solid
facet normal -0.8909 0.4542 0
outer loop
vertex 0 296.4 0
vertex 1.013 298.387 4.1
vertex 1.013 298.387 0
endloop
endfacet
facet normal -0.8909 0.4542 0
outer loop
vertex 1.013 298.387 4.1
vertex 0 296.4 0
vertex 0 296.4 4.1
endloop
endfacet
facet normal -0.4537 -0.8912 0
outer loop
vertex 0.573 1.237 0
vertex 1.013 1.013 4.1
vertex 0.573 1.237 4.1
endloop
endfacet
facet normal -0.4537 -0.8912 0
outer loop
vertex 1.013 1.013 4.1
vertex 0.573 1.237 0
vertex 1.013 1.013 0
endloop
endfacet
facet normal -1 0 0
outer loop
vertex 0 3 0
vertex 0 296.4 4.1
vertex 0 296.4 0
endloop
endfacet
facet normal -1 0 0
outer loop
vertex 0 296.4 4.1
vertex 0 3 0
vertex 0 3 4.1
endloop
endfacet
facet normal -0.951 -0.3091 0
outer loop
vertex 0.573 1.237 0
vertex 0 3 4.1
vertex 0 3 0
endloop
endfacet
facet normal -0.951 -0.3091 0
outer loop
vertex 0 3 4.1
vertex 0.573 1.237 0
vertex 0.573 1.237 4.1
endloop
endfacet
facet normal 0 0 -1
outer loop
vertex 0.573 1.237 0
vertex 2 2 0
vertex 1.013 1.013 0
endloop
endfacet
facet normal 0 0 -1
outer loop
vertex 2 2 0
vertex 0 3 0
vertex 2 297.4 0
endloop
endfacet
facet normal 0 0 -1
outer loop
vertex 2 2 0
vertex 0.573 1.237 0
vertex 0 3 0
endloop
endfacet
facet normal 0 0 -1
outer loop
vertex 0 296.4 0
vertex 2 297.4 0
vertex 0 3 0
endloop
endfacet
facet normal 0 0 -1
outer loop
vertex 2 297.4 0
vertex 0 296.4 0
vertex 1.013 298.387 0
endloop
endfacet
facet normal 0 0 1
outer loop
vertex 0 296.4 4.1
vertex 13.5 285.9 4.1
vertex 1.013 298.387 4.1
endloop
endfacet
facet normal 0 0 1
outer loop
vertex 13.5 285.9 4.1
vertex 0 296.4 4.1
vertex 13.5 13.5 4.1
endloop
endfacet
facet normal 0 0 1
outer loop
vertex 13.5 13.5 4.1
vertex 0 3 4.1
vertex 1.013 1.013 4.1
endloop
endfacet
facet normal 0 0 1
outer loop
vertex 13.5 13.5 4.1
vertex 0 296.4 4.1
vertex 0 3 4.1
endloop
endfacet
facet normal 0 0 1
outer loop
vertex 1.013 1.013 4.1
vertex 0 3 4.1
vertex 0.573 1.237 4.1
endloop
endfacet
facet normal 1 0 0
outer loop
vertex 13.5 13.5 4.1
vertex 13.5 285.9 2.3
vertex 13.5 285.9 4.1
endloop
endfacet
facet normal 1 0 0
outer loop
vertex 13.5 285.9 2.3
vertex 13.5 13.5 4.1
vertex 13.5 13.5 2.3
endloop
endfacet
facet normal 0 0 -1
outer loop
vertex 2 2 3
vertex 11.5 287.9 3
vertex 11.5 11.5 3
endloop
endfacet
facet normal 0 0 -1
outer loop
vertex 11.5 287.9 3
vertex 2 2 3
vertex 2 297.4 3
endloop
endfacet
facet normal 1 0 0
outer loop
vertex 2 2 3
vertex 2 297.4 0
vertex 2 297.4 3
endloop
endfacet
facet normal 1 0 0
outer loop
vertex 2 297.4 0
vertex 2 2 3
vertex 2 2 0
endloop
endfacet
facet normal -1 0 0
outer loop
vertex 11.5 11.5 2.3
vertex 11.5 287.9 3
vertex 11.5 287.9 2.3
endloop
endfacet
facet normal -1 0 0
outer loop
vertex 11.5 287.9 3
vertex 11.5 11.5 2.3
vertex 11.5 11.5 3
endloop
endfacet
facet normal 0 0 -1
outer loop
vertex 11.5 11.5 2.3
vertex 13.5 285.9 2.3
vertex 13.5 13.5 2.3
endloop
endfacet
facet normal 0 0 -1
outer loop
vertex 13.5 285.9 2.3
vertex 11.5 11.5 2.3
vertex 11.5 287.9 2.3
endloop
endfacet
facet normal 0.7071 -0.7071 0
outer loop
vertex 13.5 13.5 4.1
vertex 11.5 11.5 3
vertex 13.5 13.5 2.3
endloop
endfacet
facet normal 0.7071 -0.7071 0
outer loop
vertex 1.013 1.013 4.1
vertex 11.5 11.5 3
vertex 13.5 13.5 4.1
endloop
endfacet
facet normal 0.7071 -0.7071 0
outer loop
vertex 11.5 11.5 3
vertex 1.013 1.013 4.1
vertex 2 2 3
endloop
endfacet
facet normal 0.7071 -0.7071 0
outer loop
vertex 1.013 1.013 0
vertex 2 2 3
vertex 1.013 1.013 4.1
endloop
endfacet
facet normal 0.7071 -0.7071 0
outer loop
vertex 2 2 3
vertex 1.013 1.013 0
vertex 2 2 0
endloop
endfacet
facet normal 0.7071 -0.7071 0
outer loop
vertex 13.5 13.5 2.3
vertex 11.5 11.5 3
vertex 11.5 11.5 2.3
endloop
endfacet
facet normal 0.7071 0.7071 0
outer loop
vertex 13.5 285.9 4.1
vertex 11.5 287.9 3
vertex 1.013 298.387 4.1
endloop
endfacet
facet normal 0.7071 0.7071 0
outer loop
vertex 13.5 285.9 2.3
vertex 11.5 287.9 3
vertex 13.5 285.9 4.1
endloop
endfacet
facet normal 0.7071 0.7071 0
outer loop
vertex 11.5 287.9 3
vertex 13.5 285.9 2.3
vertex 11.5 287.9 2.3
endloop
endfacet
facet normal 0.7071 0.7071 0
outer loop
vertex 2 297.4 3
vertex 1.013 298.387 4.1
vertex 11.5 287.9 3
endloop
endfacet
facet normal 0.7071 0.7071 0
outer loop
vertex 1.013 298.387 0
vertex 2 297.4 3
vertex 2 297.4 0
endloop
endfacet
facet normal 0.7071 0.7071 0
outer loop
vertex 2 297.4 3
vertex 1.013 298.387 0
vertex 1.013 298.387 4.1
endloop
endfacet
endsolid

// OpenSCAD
// ============================================================
// Front Bezel - Left Side (mitered 45° corners)
// ============================================================
include <common.scad>

module bezel_left() {
    bezel_side("left");
}

bezel_left();
